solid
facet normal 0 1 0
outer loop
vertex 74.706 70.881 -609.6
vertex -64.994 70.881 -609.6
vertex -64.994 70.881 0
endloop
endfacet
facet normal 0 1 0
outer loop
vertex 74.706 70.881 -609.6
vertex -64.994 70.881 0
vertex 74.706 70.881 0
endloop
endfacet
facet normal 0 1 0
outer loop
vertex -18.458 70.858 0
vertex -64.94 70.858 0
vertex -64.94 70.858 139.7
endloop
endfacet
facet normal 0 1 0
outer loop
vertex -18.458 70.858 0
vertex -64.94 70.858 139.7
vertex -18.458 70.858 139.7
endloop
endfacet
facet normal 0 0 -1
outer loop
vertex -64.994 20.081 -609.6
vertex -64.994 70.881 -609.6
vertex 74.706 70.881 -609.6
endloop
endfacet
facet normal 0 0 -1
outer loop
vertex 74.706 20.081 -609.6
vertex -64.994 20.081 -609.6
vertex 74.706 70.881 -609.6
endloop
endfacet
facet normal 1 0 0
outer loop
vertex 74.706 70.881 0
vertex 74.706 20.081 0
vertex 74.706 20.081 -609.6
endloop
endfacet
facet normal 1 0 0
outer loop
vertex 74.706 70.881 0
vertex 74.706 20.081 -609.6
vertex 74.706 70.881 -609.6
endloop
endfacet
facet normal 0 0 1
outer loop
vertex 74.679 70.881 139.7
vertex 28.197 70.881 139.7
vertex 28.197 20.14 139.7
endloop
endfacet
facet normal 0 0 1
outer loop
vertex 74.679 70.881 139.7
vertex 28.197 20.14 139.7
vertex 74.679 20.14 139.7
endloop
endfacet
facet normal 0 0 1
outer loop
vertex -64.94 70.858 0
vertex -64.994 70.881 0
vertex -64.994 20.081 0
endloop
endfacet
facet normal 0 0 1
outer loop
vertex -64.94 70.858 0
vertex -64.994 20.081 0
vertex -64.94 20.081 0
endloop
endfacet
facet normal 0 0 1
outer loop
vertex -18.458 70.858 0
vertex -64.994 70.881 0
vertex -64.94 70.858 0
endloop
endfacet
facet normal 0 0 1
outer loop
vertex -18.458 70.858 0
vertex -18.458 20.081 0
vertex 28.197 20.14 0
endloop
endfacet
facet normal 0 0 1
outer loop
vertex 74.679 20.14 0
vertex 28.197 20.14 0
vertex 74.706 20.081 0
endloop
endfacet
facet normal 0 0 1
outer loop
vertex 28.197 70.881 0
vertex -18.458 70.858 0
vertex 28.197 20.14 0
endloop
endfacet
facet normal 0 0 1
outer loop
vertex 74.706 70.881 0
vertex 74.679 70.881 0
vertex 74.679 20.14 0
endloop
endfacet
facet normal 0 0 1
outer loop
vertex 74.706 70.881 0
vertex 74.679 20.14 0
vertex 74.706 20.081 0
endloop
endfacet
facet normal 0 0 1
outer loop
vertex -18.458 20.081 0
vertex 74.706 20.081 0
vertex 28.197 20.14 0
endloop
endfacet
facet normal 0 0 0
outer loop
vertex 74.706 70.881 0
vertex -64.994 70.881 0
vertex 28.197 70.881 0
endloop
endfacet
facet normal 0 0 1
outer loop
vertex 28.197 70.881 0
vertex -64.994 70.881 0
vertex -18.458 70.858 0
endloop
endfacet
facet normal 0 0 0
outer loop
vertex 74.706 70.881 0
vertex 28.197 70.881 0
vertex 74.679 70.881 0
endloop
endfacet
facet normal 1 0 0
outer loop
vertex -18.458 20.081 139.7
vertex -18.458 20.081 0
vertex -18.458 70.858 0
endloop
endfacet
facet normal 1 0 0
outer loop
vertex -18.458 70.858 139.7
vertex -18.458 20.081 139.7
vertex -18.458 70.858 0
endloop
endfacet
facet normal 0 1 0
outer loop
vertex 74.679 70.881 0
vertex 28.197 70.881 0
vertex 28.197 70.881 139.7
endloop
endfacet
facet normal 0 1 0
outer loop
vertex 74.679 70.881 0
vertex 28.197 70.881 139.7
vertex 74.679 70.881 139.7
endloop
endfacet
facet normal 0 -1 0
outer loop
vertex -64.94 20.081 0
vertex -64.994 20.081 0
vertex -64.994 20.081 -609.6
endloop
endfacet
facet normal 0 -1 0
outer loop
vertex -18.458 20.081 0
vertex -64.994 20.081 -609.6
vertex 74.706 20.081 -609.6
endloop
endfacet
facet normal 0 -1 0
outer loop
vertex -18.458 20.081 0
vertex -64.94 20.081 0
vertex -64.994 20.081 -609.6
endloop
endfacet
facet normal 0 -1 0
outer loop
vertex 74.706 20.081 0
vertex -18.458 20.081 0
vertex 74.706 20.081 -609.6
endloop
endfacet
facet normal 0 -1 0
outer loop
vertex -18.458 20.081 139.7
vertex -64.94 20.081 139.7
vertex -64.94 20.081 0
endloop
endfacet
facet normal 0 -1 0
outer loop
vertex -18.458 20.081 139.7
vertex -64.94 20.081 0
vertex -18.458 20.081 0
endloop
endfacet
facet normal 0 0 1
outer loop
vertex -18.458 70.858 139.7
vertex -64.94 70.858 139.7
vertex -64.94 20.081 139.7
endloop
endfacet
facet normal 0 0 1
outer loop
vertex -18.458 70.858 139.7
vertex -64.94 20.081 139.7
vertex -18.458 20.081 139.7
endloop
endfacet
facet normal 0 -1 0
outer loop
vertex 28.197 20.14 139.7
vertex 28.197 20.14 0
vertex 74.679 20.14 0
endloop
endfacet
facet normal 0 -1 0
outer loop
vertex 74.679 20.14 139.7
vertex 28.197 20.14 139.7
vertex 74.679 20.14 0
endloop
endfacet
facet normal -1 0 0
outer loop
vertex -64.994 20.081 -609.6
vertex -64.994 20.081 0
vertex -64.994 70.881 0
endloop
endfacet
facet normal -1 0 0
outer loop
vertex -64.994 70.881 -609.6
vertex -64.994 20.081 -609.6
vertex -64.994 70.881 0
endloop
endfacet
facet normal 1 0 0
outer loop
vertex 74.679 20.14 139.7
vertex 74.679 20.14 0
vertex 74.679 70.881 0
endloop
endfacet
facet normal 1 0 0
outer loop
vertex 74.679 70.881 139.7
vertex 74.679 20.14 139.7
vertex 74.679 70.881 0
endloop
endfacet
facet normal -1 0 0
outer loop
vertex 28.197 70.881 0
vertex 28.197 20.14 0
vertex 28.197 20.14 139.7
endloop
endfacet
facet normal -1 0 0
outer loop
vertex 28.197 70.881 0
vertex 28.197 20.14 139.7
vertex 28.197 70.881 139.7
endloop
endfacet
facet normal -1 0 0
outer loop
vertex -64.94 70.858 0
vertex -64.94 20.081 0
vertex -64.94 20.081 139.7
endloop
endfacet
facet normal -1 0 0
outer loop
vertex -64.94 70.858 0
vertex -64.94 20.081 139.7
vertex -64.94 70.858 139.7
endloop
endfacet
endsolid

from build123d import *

# Parameters (mm, degrees)
F0_W     = 139.7
F0_H     = 50.8
F1_DEPTH = 609.6
F2_W     = 46.482
F2_H     = 50.776334
F3_DEPTH = 139.7
F4_W     = 46.482
F4_H     = 50.741273
F5_DEPTH = 139.7


with BuildPart() as f1:
    # F0 (on Top) → F1 (new body)
    with BuildSketch(Plane.XY):
        with Locations((4.855842, 45.481372)):
            Rectangle(F0_W, F0_H)
    extrude(amount=-F1_DEPTH)

    # F2 (on face) → F3 (join)
    with BuildSketch(Plane.XY):
        with Locations((-41.699169, 45.469539)):
            Rectangle(F2_W, F2_H)
    extrude(amount=F3_DEPTH)

    # F4 (on face) → F5 (join)
    with BuildSketch(Plane.XY):
        with Locations((51.438496, 45.510735)):
            Rectangle(F4_W, F4_H)
    extrude(amount=F5_DEPTH)


solid = f1.part
